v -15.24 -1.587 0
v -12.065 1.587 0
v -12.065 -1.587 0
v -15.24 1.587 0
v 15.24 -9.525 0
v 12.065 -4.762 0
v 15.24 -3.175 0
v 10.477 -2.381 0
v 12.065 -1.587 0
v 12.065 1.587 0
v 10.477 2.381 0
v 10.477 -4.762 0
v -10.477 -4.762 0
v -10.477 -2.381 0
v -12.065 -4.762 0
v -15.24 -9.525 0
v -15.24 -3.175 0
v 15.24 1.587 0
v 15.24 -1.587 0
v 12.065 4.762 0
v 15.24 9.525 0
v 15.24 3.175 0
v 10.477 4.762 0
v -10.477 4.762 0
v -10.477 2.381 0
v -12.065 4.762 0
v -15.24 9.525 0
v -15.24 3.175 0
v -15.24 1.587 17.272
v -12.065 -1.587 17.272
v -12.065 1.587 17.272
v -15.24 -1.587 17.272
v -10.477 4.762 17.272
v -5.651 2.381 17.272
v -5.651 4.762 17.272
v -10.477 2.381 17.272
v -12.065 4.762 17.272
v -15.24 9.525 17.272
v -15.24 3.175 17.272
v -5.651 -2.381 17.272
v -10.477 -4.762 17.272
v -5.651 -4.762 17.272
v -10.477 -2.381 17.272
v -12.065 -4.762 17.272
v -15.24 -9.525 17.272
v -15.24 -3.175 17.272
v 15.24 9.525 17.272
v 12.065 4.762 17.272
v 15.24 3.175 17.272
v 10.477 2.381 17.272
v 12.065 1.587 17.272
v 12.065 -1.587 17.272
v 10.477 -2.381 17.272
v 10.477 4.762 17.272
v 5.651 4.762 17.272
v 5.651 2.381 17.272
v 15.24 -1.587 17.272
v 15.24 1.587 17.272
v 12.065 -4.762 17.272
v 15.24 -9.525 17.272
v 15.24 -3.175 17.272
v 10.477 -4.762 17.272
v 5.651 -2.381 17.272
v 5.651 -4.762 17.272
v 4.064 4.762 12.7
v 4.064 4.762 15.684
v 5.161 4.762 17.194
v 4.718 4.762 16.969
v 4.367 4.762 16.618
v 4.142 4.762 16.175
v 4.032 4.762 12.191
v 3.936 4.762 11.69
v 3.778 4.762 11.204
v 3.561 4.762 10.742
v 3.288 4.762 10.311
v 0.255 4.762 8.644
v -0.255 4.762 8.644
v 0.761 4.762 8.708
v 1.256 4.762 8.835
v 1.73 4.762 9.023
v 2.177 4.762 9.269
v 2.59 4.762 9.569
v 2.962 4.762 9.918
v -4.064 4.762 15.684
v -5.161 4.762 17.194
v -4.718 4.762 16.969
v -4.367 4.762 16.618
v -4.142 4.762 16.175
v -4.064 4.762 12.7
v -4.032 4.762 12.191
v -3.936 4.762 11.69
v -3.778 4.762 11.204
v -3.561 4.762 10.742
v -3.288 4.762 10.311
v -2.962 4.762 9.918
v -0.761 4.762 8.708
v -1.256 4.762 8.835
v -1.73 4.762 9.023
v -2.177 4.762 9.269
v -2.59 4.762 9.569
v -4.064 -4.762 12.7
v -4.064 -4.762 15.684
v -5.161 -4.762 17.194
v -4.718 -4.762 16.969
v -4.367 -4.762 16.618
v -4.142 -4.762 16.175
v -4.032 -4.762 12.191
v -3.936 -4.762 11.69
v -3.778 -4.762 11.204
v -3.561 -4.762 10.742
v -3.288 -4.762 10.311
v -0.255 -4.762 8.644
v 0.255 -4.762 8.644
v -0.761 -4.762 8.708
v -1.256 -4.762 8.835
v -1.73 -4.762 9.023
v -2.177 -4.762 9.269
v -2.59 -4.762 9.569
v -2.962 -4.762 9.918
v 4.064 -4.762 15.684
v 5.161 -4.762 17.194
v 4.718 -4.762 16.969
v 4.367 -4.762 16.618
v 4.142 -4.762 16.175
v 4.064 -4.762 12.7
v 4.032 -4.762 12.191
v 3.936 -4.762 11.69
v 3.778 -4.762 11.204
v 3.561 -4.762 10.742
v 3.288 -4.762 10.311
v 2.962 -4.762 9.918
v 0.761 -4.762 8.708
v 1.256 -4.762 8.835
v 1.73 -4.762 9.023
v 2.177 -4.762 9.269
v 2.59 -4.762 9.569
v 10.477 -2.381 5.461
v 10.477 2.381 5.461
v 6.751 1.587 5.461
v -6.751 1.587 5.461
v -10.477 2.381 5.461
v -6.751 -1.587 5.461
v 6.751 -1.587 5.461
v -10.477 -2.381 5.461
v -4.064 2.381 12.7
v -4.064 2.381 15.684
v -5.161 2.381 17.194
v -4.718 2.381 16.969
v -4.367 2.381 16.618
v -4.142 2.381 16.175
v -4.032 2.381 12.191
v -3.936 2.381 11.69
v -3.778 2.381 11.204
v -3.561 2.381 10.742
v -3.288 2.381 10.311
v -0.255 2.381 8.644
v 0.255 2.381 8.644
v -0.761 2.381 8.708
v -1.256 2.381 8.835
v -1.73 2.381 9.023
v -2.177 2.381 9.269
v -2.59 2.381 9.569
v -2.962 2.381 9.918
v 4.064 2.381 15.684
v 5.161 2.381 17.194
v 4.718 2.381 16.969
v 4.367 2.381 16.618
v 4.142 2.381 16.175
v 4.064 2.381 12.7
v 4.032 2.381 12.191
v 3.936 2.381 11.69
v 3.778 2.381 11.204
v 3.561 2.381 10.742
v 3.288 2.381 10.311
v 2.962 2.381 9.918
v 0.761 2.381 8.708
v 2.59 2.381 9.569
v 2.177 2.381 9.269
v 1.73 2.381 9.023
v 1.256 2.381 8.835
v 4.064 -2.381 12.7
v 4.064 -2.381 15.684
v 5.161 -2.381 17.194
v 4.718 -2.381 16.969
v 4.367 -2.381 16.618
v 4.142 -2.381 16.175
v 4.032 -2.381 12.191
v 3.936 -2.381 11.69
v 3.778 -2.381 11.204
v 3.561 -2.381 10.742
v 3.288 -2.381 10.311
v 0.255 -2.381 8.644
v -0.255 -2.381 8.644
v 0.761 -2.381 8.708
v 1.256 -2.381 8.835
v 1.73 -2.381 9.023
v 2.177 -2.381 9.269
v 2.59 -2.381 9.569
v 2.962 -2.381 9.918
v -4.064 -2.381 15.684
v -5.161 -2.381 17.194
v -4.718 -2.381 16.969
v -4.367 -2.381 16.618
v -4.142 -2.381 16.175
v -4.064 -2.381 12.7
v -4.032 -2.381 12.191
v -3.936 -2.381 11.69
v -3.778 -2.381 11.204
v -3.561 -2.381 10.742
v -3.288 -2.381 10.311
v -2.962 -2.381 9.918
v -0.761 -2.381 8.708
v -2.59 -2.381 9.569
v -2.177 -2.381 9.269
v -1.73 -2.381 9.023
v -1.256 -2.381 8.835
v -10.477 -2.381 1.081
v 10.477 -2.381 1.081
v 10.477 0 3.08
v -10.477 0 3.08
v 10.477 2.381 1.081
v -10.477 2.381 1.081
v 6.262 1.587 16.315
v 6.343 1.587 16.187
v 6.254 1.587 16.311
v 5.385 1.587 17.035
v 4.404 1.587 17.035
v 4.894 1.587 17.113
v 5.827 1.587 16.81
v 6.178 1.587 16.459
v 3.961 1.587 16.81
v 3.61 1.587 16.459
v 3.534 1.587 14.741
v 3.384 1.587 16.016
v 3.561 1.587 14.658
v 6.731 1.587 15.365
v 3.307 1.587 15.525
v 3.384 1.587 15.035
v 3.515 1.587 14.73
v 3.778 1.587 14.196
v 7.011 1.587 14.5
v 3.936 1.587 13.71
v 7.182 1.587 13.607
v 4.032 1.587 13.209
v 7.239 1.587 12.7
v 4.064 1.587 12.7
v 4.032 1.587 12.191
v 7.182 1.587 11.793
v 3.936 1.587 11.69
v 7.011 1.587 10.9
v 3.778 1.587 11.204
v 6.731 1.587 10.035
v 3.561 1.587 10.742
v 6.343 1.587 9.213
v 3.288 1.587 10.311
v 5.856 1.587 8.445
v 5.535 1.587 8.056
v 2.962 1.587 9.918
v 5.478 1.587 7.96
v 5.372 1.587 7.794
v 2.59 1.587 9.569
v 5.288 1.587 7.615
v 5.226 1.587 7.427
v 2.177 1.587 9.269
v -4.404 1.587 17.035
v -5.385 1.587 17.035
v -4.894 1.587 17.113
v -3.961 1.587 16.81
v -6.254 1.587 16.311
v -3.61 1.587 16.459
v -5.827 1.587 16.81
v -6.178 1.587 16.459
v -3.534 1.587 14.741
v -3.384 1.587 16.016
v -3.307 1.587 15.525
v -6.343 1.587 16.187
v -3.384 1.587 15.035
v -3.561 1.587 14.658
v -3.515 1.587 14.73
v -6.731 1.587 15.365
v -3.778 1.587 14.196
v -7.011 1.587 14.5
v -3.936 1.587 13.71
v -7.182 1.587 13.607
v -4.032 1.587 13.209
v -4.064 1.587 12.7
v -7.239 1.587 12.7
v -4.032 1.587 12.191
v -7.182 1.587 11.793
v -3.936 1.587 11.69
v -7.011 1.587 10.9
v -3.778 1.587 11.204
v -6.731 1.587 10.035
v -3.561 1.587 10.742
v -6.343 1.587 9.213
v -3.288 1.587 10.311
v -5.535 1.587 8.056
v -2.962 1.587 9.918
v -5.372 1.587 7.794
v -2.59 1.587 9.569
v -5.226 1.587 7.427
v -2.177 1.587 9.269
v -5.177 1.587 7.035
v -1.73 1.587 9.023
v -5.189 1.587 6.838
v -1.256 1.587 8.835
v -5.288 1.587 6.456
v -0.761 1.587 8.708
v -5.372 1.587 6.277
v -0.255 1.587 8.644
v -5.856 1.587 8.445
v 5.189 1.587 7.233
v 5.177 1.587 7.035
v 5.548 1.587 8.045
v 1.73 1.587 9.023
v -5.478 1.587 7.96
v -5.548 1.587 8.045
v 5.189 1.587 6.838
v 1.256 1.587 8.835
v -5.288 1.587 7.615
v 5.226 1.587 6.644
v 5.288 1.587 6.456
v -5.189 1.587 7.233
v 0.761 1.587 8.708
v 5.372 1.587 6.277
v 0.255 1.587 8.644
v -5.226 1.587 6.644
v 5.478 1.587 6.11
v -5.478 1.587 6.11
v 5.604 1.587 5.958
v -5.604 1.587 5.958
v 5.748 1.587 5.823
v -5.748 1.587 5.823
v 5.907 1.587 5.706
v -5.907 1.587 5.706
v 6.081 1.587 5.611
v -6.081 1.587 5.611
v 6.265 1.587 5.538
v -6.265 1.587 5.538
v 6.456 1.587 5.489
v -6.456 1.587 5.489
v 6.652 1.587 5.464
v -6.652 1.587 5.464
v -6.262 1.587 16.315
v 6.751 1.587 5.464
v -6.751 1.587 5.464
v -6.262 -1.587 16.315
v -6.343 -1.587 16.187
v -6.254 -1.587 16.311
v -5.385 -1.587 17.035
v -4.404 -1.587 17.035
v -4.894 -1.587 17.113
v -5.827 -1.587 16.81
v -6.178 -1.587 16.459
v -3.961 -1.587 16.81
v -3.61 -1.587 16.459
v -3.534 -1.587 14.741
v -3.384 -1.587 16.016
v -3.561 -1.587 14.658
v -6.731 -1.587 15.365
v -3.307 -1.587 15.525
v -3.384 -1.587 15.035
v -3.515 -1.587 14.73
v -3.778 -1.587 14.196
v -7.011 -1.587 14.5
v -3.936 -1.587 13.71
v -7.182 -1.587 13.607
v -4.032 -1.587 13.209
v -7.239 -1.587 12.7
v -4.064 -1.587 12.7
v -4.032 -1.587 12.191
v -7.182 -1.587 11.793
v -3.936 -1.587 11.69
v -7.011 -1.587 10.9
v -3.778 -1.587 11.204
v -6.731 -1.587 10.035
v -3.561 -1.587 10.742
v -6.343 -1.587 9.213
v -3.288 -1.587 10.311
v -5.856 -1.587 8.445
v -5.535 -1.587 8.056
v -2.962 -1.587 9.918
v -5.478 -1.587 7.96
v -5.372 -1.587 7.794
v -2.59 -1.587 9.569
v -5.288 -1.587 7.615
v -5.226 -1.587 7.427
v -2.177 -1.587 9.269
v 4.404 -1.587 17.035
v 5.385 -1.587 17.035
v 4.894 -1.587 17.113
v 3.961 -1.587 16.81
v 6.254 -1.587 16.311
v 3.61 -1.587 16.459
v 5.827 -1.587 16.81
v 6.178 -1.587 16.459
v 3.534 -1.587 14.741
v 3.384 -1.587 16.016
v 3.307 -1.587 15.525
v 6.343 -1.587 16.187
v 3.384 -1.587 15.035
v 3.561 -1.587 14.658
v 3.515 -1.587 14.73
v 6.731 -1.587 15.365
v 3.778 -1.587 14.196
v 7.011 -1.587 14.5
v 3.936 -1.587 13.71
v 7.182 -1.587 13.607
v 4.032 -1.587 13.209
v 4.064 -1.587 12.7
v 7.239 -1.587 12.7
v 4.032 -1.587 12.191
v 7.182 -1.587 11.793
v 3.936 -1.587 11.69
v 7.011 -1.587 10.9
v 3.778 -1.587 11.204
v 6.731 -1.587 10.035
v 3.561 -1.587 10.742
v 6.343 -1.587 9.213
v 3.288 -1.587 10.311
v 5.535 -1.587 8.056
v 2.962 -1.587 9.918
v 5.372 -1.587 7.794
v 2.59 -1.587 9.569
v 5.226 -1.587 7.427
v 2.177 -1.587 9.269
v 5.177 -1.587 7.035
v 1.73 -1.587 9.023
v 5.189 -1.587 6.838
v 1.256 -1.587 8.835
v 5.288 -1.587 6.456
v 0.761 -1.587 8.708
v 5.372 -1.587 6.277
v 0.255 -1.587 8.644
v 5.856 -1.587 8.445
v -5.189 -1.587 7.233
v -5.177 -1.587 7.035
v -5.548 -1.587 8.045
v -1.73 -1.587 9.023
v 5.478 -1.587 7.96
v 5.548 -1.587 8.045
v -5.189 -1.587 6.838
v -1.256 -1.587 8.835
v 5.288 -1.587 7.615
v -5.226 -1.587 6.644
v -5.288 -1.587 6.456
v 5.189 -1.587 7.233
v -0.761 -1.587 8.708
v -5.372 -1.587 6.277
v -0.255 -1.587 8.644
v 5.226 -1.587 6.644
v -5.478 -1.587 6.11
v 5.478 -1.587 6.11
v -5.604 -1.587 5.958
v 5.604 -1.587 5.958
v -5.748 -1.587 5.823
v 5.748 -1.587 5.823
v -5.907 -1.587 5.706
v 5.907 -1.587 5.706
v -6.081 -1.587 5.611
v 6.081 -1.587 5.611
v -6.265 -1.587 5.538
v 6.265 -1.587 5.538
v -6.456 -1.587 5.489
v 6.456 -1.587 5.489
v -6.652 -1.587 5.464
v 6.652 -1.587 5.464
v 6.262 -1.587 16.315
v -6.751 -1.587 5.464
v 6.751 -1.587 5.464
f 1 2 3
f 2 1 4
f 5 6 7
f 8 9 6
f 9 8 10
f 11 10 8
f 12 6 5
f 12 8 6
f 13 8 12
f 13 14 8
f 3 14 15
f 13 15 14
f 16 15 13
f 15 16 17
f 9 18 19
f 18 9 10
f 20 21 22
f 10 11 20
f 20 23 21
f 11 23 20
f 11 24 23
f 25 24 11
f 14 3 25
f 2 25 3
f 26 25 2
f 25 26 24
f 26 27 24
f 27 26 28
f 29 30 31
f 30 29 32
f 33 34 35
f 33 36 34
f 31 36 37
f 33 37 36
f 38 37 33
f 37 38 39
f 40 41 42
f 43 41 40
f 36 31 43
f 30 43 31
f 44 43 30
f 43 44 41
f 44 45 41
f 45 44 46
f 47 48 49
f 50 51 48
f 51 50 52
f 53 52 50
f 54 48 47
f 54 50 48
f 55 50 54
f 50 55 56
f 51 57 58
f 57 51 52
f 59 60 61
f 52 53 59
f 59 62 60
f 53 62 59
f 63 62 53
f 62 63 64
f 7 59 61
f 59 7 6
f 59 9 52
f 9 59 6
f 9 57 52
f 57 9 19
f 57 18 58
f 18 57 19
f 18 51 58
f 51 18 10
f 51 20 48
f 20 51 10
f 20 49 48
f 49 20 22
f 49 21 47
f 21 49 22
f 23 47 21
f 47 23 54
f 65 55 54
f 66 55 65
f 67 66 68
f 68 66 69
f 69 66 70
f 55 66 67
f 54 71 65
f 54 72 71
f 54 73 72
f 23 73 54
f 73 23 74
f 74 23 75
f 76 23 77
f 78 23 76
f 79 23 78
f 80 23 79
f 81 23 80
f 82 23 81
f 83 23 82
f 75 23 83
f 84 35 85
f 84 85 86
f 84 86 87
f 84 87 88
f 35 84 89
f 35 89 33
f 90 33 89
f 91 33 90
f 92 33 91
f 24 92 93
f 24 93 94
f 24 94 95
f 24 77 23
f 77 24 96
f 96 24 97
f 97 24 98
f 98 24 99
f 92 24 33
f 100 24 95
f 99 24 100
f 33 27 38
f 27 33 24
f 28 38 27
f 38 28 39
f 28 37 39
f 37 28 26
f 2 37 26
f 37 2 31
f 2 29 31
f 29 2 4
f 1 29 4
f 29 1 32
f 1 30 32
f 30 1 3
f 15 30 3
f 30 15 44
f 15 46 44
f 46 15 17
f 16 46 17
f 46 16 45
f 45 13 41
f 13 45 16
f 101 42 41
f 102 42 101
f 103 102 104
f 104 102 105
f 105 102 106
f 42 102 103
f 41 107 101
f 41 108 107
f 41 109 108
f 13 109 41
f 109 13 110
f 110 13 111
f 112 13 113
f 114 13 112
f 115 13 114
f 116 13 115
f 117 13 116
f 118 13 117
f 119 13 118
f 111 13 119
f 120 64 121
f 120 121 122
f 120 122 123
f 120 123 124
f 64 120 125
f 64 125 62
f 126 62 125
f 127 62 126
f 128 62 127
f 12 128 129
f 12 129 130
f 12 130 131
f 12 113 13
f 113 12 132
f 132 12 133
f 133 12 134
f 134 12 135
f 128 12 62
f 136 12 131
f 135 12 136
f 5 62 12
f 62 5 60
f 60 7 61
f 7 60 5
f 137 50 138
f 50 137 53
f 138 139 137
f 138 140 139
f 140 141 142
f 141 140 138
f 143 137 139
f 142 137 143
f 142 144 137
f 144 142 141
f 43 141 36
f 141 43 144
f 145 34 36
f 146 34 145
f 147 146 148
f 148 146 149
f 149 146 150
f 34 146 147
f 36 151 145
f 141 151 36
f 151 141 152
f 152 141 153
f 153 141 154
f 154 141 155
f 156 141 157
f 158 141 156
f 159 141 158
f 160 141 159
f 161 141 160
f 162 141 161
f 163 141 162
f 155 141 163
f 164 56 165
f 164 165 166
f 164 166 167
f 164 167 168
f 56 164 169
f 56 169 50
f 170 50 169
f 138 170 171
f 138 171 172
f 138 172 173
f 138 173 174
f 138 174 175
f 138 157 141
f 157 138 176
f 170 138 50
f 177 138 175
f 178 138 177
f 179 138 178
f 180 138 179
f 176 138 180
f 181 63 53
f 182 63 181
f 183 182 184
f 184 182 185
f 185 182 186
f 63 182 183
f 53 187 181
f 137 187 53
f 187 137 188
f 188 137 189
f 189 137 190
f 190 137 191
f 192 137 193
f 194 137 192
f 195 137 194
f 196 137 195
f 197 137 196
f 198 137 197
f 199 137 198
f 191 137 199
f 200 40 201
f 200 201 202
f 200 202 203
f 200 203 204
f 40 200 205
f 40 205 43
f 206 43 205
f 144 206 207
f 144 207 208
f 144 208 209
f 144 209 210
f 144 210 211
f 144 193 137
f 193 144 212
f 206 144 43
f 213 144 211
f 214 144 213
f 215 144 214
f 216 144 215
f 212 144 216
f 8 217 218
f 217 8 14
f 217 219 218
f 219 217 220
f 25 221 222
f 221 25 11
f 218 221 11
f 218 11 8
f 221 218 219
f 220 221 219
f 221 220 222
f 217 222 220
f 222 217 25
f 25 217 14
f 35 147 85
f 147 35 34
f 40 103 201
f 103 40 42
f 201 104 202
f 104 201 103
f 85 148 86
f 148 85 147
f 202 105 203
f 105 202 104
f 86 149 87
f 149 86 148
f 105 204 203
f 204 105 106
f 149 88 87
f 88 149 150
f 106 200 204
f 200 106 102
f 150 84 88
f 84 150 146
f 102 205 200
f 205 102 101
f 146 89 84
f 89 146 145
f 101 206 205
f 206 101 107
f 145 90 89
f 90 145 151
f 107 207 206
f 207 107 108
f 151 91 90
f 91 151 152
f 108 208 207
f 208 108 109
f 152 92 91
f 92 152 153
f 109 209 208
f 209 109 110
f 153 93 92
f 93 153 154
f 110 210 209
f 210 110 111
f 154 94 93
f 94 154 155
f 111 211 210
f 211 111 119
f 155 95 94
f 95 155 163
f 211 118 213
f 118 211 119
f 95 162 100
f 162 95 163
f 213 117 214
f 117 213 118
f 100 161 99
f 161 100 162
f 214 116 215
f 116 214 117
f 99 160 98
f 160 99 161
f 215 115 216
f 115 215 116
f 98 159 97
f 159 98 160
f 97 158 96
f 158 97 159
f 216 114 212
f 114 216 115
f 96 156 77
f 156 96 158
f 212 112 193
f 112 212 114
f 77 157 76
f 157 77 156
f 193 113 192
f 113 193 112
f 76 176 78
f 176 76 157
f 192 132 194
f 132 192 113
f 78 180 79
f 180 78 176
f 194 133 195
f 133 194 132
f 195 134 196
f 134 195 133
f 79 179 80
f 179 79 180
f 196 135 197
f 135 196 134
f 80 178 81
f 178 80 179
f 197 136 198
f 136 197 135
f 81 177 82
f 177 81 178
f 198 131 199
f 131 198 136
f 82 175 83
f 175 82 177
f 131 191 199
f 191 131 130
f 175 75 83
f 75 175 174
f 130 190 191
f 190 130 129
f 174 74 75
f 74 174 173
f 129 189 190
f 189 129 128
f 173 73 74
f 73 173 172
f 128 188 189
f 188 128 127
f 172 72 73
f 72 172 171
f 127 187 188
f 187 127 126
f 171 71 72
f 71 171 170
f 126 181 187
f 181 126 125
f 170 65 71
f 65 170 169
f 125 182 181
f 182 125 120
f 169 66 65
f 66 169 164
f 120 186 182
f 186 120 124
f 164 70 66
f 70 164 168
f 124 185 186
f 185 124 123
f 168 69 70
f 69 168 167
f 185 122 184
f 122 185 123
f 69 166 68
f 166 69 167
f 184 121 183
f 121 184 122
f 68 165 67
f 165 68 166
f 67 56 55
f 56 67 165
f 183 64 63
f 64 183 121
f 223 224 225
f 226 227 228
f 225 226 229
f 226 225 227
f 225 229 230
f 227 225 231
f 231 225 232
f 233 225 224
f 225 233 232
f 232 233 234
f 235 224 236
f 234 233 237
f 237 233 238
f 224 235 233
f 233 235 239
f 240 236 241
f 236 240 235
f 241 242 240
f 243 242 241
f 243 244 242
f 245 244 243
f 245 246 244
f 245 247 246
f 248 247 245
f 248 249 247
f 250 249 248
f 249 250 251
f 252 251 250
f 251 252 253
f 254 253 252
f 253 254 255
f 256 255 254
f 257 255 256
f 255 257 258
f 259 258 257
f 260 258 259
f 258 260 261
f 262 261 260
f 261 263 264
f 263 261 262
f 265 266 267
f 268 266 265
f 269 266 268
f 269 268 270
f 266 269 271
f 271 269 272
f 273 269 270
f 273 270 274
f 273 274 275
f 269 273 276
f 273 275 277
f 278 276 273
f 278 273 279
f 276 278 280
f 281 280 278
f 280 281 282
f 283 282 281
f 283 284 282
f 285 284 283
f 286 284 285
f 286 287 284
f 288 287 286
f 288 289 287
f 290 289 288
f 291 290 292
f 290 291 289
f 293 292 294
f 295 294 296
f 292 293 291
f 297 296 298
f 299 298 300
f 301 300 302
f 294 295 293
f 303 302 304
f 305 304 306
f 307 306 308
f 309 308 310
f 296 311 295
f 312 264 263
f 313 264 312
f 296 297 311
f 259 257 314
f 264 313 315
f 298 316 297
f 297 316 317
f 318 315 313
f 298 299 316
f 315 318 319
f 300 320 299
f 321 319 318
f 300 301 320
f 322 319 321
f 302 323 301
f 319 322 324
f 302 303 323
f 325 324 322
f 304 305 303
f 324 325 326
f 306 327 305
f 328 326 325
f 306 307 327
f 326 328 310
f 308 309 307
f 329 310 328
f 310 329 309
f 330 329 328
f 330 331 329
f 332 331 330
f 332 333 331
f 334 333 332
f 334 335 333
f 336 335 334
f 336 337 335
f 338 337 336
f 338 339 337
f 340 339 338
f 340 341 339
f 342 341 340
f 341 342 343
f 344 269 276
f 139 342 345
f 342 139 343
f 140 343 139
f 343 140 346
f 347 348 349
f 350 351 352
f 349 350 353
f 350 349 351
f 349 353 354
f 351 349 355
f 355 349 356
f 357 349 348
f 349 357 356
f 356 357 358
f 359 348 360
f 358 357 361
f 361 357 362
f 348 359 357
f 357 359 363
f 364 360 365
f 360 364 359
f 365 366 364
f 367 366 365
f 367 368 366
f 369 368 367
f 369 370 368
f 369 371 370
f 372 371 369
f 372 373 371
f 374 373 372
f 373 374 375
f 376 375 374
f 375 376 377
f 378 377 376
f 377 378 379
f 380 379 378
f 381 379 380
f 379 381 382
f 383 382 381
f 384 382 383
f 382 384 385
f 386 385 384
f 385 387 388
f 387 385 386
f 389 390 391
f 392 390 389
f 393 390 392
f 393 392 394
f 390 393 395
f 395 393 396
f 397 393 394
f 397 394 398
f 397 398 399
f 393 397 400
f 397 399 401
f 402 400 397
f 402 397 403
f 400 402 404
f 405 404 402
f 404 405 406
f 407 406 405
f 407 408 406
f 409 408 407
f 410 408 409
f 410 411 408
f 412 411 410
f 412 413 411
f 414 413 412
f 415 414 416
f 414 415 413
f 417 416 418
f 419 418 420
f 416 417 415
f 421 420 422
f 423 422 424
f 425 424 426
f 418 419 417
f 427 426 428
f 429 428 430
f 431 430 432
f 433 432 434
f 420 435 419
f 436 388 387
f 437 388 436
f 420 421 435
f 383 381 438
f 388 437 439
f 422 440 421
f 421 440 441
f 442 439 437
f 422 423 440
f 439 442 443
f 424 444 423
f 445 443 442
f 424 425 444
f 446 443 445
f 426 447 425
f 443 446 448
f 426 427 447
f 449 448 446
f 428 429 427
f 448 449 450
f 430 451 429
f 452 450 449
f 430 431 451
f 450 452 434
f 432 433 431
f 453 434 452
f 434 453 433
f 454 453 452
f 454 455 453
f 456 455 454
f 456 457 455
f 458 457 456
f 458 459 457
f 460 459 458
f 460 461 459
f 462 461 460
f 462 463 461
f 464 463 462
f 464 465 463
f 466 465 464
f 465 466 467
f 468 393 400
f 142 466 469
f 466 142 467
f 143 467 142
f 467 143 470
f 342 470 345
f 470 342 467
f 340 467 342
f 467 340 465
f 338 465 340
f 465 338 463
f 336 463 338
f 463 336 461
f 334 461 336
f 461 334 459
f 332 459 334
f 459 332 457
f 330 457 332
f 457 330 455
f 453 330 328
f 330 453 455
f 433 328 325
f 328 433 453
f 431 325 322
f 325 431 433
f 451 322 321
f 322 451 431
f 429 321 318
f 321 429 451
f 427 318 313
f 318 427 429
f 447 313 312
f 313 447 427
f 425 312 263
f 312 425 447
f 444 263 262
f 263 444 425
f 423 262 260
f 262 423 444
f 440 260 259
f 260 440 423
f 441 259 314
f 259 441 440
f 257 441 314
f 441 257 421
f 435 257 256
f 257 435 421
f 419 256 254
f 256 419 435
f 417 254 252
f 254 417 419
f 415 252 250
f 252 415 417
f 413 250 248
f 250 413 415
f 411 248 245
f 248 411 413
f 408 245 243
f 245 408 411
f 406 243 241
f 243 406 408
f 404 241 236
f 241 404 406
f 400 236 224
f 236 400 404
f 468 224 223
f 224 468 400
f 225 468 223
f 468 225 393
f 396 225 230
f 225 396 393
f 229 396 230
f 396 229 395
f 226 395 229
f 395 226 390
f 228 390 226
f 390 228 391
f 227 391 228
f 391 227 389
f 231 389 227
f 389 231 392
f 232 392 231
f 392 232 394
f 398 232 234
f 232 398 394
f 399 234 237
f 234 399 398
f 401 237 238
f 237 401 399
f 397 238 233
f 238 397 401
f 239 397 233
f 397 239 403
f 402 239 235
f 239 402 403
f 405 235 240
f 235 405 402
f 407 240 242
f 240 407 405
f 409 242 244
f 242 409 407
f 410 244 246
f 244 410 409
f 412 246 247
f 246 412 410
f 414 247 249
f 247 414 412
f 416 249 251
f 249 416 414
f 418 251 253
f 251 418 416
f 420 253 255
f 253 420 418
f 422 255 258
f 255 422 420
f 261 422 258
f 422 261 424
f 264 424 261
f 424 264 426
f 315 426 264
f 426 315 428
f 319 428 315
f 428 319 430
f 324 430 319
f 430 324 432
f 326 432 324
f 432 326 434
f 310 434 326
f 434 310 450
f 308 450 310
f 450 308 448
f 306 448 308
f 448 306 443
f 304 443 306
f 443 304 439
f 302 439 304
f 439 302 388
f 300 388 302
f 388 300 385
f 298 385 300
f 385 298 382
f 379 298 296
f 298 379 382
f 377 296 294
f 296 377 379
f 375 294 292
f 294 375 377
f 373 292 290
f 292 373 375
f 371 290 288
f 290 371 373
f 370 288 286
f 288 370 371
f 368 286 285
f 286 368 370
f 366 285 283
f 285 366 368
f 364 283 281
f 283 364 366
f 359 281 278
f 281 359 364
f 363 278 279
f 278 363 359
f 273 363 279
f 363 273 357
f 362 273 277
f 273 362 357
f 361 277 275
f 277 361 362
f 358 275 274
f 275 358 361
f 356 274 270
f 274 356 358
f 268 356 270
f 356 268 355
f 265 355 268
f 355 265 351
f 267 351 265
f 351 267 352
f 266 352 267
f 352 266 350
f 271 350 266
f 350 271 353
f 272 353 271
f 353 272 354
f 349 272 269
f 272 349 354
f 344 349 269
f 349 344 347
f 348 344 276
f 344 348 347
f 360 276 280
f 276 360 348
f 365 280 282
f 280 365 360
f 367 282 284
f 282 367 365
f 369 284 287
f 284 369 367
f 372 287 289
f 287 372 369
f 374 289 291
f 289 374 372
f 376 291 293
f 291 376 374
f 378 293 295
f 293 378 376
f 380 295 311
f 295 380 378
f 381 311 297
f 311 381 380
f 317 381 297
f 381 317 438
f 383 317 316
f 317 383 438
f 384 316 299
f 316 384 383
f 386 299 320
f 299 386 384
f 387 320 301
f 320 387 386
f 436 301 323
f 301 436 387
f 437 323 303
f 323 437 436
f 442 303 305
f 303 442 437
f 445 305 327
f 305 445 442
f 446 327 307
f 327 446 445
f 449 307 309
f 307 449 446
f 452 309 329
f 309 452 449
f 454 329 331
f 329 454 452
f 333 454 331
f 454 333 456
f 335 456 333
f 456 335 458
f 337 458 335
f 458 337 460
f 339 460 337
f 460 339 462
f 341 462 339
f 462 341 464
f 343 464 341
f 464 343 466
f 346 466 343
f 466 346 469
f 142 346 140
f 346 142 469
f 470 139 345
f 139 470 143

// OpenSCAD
/***************************************************//**
 * Customizable DeWALT DW2190 Divider with Shank Clasp *
 * by Tobin Kyllingstad                                *
 * 2019/05/05                                          *
 *                                                     *
 * Divider for DeWalt Medium Tough Case (DW2190) with  *
 * integrated shank clasp.                             *
 * https://www.thingiverse.com/kyllingstad             *
 *******************************************************/
// (inches or millimeters)
Units = 1; // [1:in,25.4:mm]
// Shank Clasp Inner Diameter
Shank_Diameter = 0.32;
// Height of shank axis above base
Axis_Height = 0.5;
// Shank clasp thickness
Clasp_Thickness = 0.125;
// Shank clasp width
Clasp_Width = 0.125;
// Gap between clasp and wall
Gap_Width = 0.03125;
// Outer wall width
Wall_Width = 0.09375;
// Thickness of supporting structure
Floor_Thickness = 0.09375;
/* [Hidden] */
max_overhang_angle = 50;
margin = 0.001;
inner_radius = Shank_Diameter/2/Units;
axis_height = Axis_Height/Units;
clasp_thickness = Clasp_Thickness/Units;
clasp_width = Clasp_Width/Units;
gap_width = Gap_Width/Units;
wall_width = Wall_Width/Units;
floor_thickness = Floor_Thickness/Units;

scale([25.4, 25.4, 25.4])
{
   clasp_divider( inner_radius, axis_height, clasp_thickness, clasp_width,
                  gap_width, wall_width, floor_thickness );
}

module clasp_divider( inner_radius,
                      axis_height,
                      clasp_thickness,
                      clasp_width,
                      gap_width,
                      wall_width,
                      floor_thickness )
{
   div_height = 0.68;
   div_width = 1.2;
   div_depth = 0.75;
   hole_width = div_width - 0.375;
   floor_height = max( axis_height - inner_radius - clasp_thickness, floor_thickness );
   union()
   {
      difference()
      {
         divider( div_height, div_width, div_depth, hole_width, clasp_thickness, clasp_width,
                  floor_thickness, floor_height, gap_width, wall_width );
         slot( inner_radius, clasp_thickness/2, div_height - axis_height, div_depth, axis_height );
      }
      translate([ 0, 0, axis_height ])
      {
            clasp( inner_radius, clasp_thickness, axis_height - floor_thickness, clasp_width );
      }
   }
}

module divider( height,
                width,
                depth,
                hole_width,
                clasp_thickness,
                clasp_width,
                floor_thickness,
                floor_height,
                gap_width,
                wall_width )
{
   middle = clasp_width + 2*gap_width + 2*wall_width;
   hole_height = height - floor_thickness;
   hole_depth = clasp_width + 2*gap_width;
   difference()
   {
      divider_base( width, depth, middle, height );
      translate( [ 0, 0, floor_height + height/2 ] )
      {
         cube( size=[ hole_width, hole_depth, height ], center=true );
      }
      base_void( hole_width, hole_depth, floor_height - floor_thickness );
   }
}

module divider_base( width,
                     depth,
                     middle,
                     height )
{
   linear_extrude( height, convexity = 10 )
   {
      divider_profile( width, depth, middle );
   }
}

module divider_profile( width,
                        depth,
                        middle )
{
   polygon(points = [ [ width/2, depth/2],
                      [ width/2, 0.125],
                      [ (width/2 - 0.125), 0.1875],
                      [ (width/2 - 0.125), 0.0625],
                      [ width/2, 0.0625],
                      [ width/2,-0.0625],
                      [ (width/2 - 0.125),-0.0625],
                      [ (width/2 - 0.125),-0.1875],
                      [ width/2,-0.125],
                      [ width/2,-depth/2],
                      [ (width/2 + middle/2 - depth/2),-middle/2],
                      [-(width/2 + middle/2 - depth/2),-middle/2],
                      [-width/2,-depth/2],
                      [-width/2,-0.125],
                      [-(width/2 - 0.125),-0.1875],
                      [-(width/2 - 0.125),-0.0625],
                      [-width/2,-0.0625],
                      [-width/2, 0.0625],
                      [-(width/2 - 0.125), 0.0625],
                      [-(width/2 - 0.125), 0.1875],
                      [-width/2, 0.125],
                      [-width/2, depth/2],
                      [-(width/2 + middle/2 - depth/2), middle/2],
                      [ (width/2 + middle/2 - depth/2), middle/2] ]);
}

module slot( inner_radius,
             corner_radius,
             top_to_axis,
             depth,
             axis_height )
{
   translate([0, 0, axis_height])
   {
      rotate([90, 0, 0])
      {
         linear_extrude(height = depth, center = true, convexity = 10 )
         {
            slot_profile( inner_radius, corner_radius, top_to_axis );
         }
      }
   }
}

module slot_profile( inner_radius,
                     corner_radius,
                     top_to_axis )
{
   difference()
   {
      union()
      {
         circle(r = inner_radius, $fn = 50);
         polygon(points = [ [ inner_radius, 0],
                            [ inner_radius, top_to_axis - corner_radius],
                            [ (inner_radius + corner_radius), top_to_axis],
                            [ (inner_radius + corner_radius), top_to_axis + margin],
                            [-(inner_radius + corner_radius), top_to_axis + margin],
                            [-(inner_radius + corner_radius), top_to_axis],
                            [-inner_radius, top_to_axis - corner_radius],
                            [-inner_radius, 0] ]);
      }
      translate([ (inner_radius + corner_radius), top_to_axis - corner_radius])
      {
         circle(r = corner_radius, $fn = 20);
      }
      translate([-(inner_radius + corner_radius), top_to_axis - corner_radius])
      {
         circle(r = corner_radius, $fn = 20);
      }
   }
}

module base_void( width,
                  depth,
                  height )
{
   rotate([0, 0, 90])
   {
      rotate([90, 0, 0])
      {
         translate([0, 0, -width/2])
         {
            linear_extrude(height = width)
            {
               base_void_profile( depth, height );
            }
         }
      }
   }
}

module base_void_profile( depth,
                          height )
{
   polygon(points = [ [ 0, height ],
                      [  depth/2, height - tan(90 - max_overhang_angle) * depth/2 ],
                      [  depth/2, -margin ],
                      [ -depth/2, -margin ],
                      [ -depth/2, height - tan(90 - max_overhang_angle) * depth/2 ] ]);
}

module clasp( inner_radius,
              clasp_thickness,
              base_to_axis,
              clasp_width )
{
   rotate([90,0,0])
   {
      linear_extrude(height = clasp_width, center = true, convexity = 10)
      {
         clasp_profile( inner_radius, clasp_thickness, base_to_axis );
      }
   }
}

module clasp_profile( inner_radius,
                      clasp_thickness,
                      base_to_axis )
{
   outer_radius = inner_radius + clasp_thickness;
   opening_angle = 60;
   fillet_radius = ( min( base_to_axis, outer_radius ) -
                     outer_radius * cos(max_overhang_angle) ) /
                   ( 1 + cos(max_overhang_angle) );
   union()
   {
      difference()
      {
         union()
         {
            circle(r = outer_radius, $fn = 50);
            polygon(points = [ [ 0,0 ],                                         // center of clasp
               [ (outer_radius + fillet_radius) * sin(max_overhang_angle),
                -(outer_radius + fillet_radius) * cos(max_overhang_angle) ],    // center of fillet
               [ (outer_radius + fillet_radius) * sin(max_overhang_angle),
               -((outer_radius + fillet_radius) * cos(max_overhang_angle) +
                 fillet_radius + margin) ],                                     // bottom fillet
               [-(outer_radius + fillet_radius) * sin(max_overhang_angle),
               -((outer_radius + fillet_radius) * cos(max_overhang_angle) +
                 fillet_radius + margin) ],                                     // bottom fillet
               [-(outer_radius + fillet_radius) * sin(max_overhang_angle),
                -(outer_radius + fillet_radius) * cos(max_overhang_angle) ] ]); // center of fillet
         }
         circle(r = inner_radius, $fn = 50);
         translate([ (outer_radius + fillet_radius) * sin(max_overhang_angle),
                    -(outer_radius + fillet_radius) * cos(max_overhang_angle), ])
         {
            circle(r = fillet_radius, $fn = 50);
         }
         translate([-(outer_radius + fillet_radius) * sin(max_overhang_angle),
                    -(outer_radius + fillet_radius) * cos(max_overhang_angle), ])
         {
            circle(r = fillet_radius, $fn = 50);
         }
         polygon(points = [ [ 0,0 ],
            [ (outer_radius) * tan(opening_angle), (outer_radius) ],
            [-(outer_radius) * tan(opening_angle), (outer_radius) ] ]);
      }
      translate([ (inner_radius + clasp_thickness/2) * sin(opening_angle),
                  (inner_radius + clasp_thickness/2) * cos(opening_angle) ])
      {
         circle(d = clasp_thickness, $fn=20);
      }
      translate([-(inner_radius + clasp_thickness/2) * sin(opening_angle),
                  (inner_radius + clasp_thickness/2) * cos(opening_angle) ])
      {
         circle(d = clasp_thickness, $fn=20);
      }
   }
}
